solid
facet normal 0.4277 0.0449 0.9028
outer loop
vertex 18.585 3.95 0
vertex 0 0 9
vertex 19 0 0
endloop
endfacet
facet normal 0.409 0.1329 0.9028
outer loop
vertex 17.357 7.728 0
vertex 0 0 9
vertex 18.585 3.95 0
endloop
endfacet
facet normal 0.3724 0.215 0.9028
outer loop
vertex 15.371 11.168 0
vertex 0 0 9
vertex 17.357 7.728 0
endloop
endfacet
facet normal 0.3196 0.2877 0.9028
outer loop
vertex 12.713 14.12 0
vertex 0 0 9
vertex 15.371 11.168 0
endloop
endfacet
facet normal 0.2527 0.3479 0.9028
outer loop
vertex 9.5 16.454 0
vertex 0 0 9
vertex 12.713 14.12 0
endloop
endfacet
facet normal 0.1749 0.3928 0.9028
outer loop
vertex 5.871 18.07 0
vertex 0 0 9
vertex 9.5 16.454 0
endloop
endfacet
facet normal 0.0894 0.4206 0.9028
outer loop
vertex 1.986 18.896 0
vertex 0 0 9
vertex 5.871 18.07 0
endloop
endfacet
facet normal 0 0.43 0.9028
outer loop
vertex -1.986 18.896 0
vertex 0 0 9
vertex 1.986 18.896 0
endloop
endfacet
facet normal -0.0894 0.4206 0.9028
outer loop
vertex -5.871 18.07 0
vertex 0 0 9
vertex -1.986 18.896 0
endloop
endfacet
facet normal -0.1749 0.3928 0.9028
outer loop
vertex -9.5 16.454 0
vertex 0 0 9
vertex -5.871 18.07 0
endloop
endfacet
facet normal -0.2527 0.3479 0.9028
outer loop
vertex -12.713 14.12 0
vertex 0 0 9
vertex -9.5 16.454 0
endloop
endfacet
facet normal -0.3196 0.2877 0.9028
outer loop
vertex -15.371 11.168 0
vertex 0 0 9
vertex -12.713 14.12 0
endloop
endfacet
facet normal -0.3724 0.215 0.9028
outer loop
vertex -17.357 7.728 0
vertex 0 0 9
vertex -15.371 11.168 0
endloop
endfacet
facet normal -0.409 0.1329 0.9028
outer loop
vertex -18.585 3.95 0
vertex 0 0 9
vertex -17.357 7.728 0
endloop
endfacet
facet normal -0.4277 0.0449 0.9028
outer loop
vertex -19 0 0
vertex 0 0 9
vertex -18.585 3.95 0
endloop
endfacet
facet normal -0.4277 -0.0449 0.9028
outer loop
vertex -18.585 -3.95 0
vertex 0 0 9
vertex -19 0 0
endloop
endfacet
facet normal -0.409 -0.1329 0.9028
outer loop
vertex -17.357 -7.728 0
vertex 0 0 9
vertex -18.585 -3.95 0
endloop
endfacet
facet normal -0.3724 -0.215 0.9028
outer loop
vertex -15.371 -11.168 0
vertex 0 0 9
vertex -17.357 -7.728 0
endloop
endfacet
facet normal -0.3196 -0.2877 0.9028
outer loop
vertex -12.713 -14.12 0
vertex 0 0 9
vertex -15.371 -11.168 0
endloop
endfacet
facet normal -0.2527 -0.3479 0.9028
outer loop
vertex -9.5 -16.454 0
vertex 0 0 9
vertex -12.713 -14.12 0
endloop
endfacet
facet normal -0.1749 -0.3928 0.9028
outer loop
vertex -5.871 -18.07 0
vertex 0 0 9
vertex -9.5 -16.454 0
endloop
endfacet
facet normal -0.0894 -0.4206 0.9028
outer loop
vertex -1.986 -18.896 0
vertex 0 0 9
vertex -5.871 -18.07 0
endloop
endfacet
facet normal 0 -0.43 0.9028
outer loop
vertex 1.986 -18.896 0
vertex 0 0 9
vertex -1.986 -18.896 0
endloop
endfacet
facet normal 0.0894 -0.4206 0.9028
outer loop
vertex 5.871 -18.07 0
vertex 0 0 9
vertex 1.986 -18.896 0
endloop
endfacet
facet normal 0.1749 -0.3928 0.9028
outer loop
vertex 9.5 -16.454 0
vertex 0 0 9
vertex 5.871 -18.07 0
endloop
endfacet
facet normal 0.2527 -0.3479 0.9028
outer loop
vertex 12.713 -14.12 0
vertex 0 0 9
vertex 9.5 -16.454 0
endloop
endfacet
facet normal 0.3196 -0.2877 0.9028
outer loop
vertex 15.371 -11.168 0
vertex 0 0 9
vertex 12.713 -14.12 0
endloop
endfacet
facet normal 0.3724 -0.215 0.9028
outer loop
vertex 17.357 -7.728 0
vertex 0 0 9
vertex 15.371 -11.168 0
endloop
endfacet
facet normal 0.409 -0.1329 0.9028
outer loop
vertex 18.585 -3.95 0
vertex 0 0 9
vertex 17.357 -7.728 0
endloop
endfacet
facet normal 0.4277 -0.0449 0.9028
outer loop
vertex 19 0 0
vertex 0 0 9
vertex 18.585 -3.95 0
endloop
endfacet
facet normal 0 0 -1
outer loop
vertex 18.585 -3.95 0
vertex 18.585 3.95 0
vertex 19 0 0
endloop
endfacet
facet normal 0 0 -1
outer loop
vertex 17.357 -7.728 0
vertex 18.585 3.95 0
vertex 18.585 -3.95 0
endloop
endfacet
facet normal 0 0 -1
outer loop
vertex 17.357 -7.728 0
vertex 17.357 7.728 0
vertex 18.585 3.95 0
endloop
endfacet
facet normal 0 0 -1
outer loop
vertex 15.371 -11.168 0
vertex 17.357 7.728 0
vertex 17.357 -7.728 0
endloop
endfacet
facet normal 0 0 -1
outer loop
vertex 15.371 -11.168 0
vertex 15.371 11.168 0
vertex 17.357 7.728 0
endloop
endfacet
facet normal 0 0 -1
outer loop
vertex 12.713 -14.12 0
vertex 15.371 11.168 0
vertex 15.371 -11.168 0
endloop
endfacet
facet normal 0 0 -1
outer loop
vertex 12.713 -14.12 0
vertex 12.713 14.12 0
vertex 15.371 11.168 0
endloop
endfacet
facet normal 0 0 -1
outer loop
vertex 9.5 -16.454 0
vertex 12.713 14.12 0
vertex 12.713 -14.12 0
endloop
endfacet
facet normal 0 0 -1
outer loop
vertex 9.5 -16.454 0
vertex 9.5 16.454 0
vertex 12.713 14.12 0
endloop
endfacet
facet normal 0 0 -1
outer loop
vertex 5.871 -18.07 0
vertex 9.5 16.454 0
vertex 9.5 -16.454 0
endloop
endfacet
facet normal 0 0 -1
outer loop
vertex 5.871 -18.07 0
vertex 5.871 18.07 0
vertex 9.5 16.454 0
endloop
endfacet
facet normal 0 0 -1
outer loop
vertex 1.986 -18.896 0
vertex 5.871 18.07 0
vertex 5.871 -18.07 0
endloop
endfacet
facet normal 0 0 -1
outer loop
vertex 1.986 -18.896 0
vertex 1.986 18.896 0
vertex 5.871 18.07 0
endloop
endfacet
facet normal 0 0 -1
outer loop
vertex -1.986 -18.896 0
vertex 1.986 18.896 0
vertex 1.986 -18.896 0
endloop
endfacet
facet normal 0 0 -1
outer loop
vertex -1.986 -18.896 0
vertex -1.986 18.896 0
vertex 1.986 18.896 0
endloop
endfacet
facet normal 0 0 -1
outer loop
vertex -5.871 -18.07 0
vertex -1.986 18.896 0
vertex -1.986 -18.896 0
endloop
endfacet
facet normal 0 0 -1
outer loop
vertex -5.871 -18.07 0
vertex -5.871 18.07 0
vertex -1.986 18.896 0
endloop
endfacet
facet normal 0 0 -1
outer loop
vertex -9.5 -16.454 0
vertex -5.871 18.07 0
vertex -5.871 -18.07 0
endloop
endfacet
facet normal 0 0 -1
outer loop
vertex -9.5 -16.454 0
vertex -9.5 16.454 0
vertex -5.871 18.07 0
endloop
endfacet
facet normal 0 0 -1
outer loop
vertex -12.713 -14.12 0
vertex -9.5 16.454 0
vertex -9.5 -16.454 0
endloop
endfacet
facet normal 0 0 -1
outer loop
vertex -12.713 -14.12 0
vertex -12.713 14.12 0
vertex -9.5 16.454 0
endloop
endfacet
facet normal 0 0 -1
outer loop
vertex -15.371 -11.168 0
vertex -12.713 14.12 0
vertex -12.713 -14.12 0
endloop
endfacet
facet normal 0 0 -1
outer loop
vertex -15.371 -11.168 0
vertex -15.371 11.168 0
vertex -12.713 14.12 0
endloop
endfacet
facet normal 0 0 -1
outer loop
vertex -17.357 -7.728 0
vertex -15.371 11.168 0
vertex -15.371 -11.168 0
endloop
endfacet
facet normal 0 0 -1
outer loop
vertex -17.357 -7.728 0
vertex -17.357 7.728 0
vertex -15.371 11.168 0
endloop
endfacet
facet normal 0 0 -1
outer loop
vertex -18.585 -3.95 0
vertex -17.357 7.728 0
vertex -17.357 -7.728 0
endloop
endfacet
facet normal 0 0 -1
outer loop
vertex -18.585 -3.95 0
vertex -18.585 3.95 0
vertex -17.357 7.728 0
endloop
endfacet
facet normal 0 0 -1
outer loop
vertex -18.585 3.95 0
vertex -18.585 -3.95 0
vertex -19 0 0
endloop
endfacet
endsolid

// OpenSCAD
// Generated by SolidPython 1.0.1 on 2020-07-29 00:46:43


cylinder(h = 9, r1 = 19, r2 = 0);
/***********************************************
*********      SolidPython code:      **********
************************************************
 
# import packages: SolidPython
from solid import *
from solid.utils import *
from itertools import chain, combinations, permutations


class Resize:

    def __init__(self, scad_file):
        self.scad_file = scad_file
        #self.scad_file = import_scad(scad_file)
        # cone/cylinder param:
        self.r1 = 0
        self.r2 = 0
        self.h = 0
        # rectangular prism param:
        self.w = 0
        self.l = 0
        # ellipse param:
        self.r = 0

    # import OpenScad code (file name corresponds to shape)


    # classify shape + parameters
    def assign(self, param1, param2, param3):
        if self.scad_file == 'cone.scad':
            self.r1 = param1
            self.r2 = param2
            self.h = param3
        elif self.scad_file == 'cylinder.scad':
            self.r1 = param1
            self.r2 = param2
            self.h = param3
        elif self.scad_file == 'rectangularPrism.scad':
            self.h = param1
            self.l = param2
            self.w = param3
        else:
            self.r = param1
            self.h = param2

    # resize parameters
    def iterate(self):
        x = range(3, 20, 2)
        i = 1
        if self.scad_file == 'cone.scad':
            tempList = list(permutations(x, 2))
            for temp in tempList:
                param1 = temp[0]
                param2 = temp[1]
                filepath = 'produced_scad_files/' + 'cone' + str(param1) + '_' + str(param2) + '_' + '.scad'
                scad_render_to_file(cylinder(h=param1, r1=param2, r2=0), filepath)

        elif self.scad_file == 'cylinder.scad':
            tempList = list(permutations(x, 3))
            for temp in tempList:
                param1 = temp[0]
                param2 = temp[1]
                filepath = 'produced_scad_files/' + 'cylinder' + str(param1) + '_' + str(param2) + '_' + '.scad'
                scad_render_to_file(cylinder(h=param1, r1=param2, r2=param2), filepath)

        elif self.scad_file == 'rectangularPrism.scad':
            tempList = list(permutations(x, 3))
            for temp in tempList:
                param1 = temp[0]
                param2 = temp[1]
                param3 = temp[2]
                filepath = 'produced_scad_files/' + 'rectangularPrism' + str(param1) + '_' + str(param2) + '_' + str(
                    param3) + '.scad'
                scad_render_to_file(cube(size=(param1, param2, param3)), filepath)

        elif self.scad_file == 'ellipse.scad':
            tempList = list(permutations(x, 4))
            for temp in tempList:
                param1 = temp[0]
                param2 = temp[1]
                param3 = temp[2]
                param4 = temp[3]
                filepath = 'produced_scad_files/' + 'ellipse' + str(param1) + '_' + str(param2) + '_' + str(param3) + '_' + str(param4) + '.scad'
                scad_render_to_file(scale([param1, param2, param3])(sphere(r=param4)), filepath)

    def render_to_scadfile(self):
        scad_render_to_file(scad, 'example.scad') 
 
************************************************/
